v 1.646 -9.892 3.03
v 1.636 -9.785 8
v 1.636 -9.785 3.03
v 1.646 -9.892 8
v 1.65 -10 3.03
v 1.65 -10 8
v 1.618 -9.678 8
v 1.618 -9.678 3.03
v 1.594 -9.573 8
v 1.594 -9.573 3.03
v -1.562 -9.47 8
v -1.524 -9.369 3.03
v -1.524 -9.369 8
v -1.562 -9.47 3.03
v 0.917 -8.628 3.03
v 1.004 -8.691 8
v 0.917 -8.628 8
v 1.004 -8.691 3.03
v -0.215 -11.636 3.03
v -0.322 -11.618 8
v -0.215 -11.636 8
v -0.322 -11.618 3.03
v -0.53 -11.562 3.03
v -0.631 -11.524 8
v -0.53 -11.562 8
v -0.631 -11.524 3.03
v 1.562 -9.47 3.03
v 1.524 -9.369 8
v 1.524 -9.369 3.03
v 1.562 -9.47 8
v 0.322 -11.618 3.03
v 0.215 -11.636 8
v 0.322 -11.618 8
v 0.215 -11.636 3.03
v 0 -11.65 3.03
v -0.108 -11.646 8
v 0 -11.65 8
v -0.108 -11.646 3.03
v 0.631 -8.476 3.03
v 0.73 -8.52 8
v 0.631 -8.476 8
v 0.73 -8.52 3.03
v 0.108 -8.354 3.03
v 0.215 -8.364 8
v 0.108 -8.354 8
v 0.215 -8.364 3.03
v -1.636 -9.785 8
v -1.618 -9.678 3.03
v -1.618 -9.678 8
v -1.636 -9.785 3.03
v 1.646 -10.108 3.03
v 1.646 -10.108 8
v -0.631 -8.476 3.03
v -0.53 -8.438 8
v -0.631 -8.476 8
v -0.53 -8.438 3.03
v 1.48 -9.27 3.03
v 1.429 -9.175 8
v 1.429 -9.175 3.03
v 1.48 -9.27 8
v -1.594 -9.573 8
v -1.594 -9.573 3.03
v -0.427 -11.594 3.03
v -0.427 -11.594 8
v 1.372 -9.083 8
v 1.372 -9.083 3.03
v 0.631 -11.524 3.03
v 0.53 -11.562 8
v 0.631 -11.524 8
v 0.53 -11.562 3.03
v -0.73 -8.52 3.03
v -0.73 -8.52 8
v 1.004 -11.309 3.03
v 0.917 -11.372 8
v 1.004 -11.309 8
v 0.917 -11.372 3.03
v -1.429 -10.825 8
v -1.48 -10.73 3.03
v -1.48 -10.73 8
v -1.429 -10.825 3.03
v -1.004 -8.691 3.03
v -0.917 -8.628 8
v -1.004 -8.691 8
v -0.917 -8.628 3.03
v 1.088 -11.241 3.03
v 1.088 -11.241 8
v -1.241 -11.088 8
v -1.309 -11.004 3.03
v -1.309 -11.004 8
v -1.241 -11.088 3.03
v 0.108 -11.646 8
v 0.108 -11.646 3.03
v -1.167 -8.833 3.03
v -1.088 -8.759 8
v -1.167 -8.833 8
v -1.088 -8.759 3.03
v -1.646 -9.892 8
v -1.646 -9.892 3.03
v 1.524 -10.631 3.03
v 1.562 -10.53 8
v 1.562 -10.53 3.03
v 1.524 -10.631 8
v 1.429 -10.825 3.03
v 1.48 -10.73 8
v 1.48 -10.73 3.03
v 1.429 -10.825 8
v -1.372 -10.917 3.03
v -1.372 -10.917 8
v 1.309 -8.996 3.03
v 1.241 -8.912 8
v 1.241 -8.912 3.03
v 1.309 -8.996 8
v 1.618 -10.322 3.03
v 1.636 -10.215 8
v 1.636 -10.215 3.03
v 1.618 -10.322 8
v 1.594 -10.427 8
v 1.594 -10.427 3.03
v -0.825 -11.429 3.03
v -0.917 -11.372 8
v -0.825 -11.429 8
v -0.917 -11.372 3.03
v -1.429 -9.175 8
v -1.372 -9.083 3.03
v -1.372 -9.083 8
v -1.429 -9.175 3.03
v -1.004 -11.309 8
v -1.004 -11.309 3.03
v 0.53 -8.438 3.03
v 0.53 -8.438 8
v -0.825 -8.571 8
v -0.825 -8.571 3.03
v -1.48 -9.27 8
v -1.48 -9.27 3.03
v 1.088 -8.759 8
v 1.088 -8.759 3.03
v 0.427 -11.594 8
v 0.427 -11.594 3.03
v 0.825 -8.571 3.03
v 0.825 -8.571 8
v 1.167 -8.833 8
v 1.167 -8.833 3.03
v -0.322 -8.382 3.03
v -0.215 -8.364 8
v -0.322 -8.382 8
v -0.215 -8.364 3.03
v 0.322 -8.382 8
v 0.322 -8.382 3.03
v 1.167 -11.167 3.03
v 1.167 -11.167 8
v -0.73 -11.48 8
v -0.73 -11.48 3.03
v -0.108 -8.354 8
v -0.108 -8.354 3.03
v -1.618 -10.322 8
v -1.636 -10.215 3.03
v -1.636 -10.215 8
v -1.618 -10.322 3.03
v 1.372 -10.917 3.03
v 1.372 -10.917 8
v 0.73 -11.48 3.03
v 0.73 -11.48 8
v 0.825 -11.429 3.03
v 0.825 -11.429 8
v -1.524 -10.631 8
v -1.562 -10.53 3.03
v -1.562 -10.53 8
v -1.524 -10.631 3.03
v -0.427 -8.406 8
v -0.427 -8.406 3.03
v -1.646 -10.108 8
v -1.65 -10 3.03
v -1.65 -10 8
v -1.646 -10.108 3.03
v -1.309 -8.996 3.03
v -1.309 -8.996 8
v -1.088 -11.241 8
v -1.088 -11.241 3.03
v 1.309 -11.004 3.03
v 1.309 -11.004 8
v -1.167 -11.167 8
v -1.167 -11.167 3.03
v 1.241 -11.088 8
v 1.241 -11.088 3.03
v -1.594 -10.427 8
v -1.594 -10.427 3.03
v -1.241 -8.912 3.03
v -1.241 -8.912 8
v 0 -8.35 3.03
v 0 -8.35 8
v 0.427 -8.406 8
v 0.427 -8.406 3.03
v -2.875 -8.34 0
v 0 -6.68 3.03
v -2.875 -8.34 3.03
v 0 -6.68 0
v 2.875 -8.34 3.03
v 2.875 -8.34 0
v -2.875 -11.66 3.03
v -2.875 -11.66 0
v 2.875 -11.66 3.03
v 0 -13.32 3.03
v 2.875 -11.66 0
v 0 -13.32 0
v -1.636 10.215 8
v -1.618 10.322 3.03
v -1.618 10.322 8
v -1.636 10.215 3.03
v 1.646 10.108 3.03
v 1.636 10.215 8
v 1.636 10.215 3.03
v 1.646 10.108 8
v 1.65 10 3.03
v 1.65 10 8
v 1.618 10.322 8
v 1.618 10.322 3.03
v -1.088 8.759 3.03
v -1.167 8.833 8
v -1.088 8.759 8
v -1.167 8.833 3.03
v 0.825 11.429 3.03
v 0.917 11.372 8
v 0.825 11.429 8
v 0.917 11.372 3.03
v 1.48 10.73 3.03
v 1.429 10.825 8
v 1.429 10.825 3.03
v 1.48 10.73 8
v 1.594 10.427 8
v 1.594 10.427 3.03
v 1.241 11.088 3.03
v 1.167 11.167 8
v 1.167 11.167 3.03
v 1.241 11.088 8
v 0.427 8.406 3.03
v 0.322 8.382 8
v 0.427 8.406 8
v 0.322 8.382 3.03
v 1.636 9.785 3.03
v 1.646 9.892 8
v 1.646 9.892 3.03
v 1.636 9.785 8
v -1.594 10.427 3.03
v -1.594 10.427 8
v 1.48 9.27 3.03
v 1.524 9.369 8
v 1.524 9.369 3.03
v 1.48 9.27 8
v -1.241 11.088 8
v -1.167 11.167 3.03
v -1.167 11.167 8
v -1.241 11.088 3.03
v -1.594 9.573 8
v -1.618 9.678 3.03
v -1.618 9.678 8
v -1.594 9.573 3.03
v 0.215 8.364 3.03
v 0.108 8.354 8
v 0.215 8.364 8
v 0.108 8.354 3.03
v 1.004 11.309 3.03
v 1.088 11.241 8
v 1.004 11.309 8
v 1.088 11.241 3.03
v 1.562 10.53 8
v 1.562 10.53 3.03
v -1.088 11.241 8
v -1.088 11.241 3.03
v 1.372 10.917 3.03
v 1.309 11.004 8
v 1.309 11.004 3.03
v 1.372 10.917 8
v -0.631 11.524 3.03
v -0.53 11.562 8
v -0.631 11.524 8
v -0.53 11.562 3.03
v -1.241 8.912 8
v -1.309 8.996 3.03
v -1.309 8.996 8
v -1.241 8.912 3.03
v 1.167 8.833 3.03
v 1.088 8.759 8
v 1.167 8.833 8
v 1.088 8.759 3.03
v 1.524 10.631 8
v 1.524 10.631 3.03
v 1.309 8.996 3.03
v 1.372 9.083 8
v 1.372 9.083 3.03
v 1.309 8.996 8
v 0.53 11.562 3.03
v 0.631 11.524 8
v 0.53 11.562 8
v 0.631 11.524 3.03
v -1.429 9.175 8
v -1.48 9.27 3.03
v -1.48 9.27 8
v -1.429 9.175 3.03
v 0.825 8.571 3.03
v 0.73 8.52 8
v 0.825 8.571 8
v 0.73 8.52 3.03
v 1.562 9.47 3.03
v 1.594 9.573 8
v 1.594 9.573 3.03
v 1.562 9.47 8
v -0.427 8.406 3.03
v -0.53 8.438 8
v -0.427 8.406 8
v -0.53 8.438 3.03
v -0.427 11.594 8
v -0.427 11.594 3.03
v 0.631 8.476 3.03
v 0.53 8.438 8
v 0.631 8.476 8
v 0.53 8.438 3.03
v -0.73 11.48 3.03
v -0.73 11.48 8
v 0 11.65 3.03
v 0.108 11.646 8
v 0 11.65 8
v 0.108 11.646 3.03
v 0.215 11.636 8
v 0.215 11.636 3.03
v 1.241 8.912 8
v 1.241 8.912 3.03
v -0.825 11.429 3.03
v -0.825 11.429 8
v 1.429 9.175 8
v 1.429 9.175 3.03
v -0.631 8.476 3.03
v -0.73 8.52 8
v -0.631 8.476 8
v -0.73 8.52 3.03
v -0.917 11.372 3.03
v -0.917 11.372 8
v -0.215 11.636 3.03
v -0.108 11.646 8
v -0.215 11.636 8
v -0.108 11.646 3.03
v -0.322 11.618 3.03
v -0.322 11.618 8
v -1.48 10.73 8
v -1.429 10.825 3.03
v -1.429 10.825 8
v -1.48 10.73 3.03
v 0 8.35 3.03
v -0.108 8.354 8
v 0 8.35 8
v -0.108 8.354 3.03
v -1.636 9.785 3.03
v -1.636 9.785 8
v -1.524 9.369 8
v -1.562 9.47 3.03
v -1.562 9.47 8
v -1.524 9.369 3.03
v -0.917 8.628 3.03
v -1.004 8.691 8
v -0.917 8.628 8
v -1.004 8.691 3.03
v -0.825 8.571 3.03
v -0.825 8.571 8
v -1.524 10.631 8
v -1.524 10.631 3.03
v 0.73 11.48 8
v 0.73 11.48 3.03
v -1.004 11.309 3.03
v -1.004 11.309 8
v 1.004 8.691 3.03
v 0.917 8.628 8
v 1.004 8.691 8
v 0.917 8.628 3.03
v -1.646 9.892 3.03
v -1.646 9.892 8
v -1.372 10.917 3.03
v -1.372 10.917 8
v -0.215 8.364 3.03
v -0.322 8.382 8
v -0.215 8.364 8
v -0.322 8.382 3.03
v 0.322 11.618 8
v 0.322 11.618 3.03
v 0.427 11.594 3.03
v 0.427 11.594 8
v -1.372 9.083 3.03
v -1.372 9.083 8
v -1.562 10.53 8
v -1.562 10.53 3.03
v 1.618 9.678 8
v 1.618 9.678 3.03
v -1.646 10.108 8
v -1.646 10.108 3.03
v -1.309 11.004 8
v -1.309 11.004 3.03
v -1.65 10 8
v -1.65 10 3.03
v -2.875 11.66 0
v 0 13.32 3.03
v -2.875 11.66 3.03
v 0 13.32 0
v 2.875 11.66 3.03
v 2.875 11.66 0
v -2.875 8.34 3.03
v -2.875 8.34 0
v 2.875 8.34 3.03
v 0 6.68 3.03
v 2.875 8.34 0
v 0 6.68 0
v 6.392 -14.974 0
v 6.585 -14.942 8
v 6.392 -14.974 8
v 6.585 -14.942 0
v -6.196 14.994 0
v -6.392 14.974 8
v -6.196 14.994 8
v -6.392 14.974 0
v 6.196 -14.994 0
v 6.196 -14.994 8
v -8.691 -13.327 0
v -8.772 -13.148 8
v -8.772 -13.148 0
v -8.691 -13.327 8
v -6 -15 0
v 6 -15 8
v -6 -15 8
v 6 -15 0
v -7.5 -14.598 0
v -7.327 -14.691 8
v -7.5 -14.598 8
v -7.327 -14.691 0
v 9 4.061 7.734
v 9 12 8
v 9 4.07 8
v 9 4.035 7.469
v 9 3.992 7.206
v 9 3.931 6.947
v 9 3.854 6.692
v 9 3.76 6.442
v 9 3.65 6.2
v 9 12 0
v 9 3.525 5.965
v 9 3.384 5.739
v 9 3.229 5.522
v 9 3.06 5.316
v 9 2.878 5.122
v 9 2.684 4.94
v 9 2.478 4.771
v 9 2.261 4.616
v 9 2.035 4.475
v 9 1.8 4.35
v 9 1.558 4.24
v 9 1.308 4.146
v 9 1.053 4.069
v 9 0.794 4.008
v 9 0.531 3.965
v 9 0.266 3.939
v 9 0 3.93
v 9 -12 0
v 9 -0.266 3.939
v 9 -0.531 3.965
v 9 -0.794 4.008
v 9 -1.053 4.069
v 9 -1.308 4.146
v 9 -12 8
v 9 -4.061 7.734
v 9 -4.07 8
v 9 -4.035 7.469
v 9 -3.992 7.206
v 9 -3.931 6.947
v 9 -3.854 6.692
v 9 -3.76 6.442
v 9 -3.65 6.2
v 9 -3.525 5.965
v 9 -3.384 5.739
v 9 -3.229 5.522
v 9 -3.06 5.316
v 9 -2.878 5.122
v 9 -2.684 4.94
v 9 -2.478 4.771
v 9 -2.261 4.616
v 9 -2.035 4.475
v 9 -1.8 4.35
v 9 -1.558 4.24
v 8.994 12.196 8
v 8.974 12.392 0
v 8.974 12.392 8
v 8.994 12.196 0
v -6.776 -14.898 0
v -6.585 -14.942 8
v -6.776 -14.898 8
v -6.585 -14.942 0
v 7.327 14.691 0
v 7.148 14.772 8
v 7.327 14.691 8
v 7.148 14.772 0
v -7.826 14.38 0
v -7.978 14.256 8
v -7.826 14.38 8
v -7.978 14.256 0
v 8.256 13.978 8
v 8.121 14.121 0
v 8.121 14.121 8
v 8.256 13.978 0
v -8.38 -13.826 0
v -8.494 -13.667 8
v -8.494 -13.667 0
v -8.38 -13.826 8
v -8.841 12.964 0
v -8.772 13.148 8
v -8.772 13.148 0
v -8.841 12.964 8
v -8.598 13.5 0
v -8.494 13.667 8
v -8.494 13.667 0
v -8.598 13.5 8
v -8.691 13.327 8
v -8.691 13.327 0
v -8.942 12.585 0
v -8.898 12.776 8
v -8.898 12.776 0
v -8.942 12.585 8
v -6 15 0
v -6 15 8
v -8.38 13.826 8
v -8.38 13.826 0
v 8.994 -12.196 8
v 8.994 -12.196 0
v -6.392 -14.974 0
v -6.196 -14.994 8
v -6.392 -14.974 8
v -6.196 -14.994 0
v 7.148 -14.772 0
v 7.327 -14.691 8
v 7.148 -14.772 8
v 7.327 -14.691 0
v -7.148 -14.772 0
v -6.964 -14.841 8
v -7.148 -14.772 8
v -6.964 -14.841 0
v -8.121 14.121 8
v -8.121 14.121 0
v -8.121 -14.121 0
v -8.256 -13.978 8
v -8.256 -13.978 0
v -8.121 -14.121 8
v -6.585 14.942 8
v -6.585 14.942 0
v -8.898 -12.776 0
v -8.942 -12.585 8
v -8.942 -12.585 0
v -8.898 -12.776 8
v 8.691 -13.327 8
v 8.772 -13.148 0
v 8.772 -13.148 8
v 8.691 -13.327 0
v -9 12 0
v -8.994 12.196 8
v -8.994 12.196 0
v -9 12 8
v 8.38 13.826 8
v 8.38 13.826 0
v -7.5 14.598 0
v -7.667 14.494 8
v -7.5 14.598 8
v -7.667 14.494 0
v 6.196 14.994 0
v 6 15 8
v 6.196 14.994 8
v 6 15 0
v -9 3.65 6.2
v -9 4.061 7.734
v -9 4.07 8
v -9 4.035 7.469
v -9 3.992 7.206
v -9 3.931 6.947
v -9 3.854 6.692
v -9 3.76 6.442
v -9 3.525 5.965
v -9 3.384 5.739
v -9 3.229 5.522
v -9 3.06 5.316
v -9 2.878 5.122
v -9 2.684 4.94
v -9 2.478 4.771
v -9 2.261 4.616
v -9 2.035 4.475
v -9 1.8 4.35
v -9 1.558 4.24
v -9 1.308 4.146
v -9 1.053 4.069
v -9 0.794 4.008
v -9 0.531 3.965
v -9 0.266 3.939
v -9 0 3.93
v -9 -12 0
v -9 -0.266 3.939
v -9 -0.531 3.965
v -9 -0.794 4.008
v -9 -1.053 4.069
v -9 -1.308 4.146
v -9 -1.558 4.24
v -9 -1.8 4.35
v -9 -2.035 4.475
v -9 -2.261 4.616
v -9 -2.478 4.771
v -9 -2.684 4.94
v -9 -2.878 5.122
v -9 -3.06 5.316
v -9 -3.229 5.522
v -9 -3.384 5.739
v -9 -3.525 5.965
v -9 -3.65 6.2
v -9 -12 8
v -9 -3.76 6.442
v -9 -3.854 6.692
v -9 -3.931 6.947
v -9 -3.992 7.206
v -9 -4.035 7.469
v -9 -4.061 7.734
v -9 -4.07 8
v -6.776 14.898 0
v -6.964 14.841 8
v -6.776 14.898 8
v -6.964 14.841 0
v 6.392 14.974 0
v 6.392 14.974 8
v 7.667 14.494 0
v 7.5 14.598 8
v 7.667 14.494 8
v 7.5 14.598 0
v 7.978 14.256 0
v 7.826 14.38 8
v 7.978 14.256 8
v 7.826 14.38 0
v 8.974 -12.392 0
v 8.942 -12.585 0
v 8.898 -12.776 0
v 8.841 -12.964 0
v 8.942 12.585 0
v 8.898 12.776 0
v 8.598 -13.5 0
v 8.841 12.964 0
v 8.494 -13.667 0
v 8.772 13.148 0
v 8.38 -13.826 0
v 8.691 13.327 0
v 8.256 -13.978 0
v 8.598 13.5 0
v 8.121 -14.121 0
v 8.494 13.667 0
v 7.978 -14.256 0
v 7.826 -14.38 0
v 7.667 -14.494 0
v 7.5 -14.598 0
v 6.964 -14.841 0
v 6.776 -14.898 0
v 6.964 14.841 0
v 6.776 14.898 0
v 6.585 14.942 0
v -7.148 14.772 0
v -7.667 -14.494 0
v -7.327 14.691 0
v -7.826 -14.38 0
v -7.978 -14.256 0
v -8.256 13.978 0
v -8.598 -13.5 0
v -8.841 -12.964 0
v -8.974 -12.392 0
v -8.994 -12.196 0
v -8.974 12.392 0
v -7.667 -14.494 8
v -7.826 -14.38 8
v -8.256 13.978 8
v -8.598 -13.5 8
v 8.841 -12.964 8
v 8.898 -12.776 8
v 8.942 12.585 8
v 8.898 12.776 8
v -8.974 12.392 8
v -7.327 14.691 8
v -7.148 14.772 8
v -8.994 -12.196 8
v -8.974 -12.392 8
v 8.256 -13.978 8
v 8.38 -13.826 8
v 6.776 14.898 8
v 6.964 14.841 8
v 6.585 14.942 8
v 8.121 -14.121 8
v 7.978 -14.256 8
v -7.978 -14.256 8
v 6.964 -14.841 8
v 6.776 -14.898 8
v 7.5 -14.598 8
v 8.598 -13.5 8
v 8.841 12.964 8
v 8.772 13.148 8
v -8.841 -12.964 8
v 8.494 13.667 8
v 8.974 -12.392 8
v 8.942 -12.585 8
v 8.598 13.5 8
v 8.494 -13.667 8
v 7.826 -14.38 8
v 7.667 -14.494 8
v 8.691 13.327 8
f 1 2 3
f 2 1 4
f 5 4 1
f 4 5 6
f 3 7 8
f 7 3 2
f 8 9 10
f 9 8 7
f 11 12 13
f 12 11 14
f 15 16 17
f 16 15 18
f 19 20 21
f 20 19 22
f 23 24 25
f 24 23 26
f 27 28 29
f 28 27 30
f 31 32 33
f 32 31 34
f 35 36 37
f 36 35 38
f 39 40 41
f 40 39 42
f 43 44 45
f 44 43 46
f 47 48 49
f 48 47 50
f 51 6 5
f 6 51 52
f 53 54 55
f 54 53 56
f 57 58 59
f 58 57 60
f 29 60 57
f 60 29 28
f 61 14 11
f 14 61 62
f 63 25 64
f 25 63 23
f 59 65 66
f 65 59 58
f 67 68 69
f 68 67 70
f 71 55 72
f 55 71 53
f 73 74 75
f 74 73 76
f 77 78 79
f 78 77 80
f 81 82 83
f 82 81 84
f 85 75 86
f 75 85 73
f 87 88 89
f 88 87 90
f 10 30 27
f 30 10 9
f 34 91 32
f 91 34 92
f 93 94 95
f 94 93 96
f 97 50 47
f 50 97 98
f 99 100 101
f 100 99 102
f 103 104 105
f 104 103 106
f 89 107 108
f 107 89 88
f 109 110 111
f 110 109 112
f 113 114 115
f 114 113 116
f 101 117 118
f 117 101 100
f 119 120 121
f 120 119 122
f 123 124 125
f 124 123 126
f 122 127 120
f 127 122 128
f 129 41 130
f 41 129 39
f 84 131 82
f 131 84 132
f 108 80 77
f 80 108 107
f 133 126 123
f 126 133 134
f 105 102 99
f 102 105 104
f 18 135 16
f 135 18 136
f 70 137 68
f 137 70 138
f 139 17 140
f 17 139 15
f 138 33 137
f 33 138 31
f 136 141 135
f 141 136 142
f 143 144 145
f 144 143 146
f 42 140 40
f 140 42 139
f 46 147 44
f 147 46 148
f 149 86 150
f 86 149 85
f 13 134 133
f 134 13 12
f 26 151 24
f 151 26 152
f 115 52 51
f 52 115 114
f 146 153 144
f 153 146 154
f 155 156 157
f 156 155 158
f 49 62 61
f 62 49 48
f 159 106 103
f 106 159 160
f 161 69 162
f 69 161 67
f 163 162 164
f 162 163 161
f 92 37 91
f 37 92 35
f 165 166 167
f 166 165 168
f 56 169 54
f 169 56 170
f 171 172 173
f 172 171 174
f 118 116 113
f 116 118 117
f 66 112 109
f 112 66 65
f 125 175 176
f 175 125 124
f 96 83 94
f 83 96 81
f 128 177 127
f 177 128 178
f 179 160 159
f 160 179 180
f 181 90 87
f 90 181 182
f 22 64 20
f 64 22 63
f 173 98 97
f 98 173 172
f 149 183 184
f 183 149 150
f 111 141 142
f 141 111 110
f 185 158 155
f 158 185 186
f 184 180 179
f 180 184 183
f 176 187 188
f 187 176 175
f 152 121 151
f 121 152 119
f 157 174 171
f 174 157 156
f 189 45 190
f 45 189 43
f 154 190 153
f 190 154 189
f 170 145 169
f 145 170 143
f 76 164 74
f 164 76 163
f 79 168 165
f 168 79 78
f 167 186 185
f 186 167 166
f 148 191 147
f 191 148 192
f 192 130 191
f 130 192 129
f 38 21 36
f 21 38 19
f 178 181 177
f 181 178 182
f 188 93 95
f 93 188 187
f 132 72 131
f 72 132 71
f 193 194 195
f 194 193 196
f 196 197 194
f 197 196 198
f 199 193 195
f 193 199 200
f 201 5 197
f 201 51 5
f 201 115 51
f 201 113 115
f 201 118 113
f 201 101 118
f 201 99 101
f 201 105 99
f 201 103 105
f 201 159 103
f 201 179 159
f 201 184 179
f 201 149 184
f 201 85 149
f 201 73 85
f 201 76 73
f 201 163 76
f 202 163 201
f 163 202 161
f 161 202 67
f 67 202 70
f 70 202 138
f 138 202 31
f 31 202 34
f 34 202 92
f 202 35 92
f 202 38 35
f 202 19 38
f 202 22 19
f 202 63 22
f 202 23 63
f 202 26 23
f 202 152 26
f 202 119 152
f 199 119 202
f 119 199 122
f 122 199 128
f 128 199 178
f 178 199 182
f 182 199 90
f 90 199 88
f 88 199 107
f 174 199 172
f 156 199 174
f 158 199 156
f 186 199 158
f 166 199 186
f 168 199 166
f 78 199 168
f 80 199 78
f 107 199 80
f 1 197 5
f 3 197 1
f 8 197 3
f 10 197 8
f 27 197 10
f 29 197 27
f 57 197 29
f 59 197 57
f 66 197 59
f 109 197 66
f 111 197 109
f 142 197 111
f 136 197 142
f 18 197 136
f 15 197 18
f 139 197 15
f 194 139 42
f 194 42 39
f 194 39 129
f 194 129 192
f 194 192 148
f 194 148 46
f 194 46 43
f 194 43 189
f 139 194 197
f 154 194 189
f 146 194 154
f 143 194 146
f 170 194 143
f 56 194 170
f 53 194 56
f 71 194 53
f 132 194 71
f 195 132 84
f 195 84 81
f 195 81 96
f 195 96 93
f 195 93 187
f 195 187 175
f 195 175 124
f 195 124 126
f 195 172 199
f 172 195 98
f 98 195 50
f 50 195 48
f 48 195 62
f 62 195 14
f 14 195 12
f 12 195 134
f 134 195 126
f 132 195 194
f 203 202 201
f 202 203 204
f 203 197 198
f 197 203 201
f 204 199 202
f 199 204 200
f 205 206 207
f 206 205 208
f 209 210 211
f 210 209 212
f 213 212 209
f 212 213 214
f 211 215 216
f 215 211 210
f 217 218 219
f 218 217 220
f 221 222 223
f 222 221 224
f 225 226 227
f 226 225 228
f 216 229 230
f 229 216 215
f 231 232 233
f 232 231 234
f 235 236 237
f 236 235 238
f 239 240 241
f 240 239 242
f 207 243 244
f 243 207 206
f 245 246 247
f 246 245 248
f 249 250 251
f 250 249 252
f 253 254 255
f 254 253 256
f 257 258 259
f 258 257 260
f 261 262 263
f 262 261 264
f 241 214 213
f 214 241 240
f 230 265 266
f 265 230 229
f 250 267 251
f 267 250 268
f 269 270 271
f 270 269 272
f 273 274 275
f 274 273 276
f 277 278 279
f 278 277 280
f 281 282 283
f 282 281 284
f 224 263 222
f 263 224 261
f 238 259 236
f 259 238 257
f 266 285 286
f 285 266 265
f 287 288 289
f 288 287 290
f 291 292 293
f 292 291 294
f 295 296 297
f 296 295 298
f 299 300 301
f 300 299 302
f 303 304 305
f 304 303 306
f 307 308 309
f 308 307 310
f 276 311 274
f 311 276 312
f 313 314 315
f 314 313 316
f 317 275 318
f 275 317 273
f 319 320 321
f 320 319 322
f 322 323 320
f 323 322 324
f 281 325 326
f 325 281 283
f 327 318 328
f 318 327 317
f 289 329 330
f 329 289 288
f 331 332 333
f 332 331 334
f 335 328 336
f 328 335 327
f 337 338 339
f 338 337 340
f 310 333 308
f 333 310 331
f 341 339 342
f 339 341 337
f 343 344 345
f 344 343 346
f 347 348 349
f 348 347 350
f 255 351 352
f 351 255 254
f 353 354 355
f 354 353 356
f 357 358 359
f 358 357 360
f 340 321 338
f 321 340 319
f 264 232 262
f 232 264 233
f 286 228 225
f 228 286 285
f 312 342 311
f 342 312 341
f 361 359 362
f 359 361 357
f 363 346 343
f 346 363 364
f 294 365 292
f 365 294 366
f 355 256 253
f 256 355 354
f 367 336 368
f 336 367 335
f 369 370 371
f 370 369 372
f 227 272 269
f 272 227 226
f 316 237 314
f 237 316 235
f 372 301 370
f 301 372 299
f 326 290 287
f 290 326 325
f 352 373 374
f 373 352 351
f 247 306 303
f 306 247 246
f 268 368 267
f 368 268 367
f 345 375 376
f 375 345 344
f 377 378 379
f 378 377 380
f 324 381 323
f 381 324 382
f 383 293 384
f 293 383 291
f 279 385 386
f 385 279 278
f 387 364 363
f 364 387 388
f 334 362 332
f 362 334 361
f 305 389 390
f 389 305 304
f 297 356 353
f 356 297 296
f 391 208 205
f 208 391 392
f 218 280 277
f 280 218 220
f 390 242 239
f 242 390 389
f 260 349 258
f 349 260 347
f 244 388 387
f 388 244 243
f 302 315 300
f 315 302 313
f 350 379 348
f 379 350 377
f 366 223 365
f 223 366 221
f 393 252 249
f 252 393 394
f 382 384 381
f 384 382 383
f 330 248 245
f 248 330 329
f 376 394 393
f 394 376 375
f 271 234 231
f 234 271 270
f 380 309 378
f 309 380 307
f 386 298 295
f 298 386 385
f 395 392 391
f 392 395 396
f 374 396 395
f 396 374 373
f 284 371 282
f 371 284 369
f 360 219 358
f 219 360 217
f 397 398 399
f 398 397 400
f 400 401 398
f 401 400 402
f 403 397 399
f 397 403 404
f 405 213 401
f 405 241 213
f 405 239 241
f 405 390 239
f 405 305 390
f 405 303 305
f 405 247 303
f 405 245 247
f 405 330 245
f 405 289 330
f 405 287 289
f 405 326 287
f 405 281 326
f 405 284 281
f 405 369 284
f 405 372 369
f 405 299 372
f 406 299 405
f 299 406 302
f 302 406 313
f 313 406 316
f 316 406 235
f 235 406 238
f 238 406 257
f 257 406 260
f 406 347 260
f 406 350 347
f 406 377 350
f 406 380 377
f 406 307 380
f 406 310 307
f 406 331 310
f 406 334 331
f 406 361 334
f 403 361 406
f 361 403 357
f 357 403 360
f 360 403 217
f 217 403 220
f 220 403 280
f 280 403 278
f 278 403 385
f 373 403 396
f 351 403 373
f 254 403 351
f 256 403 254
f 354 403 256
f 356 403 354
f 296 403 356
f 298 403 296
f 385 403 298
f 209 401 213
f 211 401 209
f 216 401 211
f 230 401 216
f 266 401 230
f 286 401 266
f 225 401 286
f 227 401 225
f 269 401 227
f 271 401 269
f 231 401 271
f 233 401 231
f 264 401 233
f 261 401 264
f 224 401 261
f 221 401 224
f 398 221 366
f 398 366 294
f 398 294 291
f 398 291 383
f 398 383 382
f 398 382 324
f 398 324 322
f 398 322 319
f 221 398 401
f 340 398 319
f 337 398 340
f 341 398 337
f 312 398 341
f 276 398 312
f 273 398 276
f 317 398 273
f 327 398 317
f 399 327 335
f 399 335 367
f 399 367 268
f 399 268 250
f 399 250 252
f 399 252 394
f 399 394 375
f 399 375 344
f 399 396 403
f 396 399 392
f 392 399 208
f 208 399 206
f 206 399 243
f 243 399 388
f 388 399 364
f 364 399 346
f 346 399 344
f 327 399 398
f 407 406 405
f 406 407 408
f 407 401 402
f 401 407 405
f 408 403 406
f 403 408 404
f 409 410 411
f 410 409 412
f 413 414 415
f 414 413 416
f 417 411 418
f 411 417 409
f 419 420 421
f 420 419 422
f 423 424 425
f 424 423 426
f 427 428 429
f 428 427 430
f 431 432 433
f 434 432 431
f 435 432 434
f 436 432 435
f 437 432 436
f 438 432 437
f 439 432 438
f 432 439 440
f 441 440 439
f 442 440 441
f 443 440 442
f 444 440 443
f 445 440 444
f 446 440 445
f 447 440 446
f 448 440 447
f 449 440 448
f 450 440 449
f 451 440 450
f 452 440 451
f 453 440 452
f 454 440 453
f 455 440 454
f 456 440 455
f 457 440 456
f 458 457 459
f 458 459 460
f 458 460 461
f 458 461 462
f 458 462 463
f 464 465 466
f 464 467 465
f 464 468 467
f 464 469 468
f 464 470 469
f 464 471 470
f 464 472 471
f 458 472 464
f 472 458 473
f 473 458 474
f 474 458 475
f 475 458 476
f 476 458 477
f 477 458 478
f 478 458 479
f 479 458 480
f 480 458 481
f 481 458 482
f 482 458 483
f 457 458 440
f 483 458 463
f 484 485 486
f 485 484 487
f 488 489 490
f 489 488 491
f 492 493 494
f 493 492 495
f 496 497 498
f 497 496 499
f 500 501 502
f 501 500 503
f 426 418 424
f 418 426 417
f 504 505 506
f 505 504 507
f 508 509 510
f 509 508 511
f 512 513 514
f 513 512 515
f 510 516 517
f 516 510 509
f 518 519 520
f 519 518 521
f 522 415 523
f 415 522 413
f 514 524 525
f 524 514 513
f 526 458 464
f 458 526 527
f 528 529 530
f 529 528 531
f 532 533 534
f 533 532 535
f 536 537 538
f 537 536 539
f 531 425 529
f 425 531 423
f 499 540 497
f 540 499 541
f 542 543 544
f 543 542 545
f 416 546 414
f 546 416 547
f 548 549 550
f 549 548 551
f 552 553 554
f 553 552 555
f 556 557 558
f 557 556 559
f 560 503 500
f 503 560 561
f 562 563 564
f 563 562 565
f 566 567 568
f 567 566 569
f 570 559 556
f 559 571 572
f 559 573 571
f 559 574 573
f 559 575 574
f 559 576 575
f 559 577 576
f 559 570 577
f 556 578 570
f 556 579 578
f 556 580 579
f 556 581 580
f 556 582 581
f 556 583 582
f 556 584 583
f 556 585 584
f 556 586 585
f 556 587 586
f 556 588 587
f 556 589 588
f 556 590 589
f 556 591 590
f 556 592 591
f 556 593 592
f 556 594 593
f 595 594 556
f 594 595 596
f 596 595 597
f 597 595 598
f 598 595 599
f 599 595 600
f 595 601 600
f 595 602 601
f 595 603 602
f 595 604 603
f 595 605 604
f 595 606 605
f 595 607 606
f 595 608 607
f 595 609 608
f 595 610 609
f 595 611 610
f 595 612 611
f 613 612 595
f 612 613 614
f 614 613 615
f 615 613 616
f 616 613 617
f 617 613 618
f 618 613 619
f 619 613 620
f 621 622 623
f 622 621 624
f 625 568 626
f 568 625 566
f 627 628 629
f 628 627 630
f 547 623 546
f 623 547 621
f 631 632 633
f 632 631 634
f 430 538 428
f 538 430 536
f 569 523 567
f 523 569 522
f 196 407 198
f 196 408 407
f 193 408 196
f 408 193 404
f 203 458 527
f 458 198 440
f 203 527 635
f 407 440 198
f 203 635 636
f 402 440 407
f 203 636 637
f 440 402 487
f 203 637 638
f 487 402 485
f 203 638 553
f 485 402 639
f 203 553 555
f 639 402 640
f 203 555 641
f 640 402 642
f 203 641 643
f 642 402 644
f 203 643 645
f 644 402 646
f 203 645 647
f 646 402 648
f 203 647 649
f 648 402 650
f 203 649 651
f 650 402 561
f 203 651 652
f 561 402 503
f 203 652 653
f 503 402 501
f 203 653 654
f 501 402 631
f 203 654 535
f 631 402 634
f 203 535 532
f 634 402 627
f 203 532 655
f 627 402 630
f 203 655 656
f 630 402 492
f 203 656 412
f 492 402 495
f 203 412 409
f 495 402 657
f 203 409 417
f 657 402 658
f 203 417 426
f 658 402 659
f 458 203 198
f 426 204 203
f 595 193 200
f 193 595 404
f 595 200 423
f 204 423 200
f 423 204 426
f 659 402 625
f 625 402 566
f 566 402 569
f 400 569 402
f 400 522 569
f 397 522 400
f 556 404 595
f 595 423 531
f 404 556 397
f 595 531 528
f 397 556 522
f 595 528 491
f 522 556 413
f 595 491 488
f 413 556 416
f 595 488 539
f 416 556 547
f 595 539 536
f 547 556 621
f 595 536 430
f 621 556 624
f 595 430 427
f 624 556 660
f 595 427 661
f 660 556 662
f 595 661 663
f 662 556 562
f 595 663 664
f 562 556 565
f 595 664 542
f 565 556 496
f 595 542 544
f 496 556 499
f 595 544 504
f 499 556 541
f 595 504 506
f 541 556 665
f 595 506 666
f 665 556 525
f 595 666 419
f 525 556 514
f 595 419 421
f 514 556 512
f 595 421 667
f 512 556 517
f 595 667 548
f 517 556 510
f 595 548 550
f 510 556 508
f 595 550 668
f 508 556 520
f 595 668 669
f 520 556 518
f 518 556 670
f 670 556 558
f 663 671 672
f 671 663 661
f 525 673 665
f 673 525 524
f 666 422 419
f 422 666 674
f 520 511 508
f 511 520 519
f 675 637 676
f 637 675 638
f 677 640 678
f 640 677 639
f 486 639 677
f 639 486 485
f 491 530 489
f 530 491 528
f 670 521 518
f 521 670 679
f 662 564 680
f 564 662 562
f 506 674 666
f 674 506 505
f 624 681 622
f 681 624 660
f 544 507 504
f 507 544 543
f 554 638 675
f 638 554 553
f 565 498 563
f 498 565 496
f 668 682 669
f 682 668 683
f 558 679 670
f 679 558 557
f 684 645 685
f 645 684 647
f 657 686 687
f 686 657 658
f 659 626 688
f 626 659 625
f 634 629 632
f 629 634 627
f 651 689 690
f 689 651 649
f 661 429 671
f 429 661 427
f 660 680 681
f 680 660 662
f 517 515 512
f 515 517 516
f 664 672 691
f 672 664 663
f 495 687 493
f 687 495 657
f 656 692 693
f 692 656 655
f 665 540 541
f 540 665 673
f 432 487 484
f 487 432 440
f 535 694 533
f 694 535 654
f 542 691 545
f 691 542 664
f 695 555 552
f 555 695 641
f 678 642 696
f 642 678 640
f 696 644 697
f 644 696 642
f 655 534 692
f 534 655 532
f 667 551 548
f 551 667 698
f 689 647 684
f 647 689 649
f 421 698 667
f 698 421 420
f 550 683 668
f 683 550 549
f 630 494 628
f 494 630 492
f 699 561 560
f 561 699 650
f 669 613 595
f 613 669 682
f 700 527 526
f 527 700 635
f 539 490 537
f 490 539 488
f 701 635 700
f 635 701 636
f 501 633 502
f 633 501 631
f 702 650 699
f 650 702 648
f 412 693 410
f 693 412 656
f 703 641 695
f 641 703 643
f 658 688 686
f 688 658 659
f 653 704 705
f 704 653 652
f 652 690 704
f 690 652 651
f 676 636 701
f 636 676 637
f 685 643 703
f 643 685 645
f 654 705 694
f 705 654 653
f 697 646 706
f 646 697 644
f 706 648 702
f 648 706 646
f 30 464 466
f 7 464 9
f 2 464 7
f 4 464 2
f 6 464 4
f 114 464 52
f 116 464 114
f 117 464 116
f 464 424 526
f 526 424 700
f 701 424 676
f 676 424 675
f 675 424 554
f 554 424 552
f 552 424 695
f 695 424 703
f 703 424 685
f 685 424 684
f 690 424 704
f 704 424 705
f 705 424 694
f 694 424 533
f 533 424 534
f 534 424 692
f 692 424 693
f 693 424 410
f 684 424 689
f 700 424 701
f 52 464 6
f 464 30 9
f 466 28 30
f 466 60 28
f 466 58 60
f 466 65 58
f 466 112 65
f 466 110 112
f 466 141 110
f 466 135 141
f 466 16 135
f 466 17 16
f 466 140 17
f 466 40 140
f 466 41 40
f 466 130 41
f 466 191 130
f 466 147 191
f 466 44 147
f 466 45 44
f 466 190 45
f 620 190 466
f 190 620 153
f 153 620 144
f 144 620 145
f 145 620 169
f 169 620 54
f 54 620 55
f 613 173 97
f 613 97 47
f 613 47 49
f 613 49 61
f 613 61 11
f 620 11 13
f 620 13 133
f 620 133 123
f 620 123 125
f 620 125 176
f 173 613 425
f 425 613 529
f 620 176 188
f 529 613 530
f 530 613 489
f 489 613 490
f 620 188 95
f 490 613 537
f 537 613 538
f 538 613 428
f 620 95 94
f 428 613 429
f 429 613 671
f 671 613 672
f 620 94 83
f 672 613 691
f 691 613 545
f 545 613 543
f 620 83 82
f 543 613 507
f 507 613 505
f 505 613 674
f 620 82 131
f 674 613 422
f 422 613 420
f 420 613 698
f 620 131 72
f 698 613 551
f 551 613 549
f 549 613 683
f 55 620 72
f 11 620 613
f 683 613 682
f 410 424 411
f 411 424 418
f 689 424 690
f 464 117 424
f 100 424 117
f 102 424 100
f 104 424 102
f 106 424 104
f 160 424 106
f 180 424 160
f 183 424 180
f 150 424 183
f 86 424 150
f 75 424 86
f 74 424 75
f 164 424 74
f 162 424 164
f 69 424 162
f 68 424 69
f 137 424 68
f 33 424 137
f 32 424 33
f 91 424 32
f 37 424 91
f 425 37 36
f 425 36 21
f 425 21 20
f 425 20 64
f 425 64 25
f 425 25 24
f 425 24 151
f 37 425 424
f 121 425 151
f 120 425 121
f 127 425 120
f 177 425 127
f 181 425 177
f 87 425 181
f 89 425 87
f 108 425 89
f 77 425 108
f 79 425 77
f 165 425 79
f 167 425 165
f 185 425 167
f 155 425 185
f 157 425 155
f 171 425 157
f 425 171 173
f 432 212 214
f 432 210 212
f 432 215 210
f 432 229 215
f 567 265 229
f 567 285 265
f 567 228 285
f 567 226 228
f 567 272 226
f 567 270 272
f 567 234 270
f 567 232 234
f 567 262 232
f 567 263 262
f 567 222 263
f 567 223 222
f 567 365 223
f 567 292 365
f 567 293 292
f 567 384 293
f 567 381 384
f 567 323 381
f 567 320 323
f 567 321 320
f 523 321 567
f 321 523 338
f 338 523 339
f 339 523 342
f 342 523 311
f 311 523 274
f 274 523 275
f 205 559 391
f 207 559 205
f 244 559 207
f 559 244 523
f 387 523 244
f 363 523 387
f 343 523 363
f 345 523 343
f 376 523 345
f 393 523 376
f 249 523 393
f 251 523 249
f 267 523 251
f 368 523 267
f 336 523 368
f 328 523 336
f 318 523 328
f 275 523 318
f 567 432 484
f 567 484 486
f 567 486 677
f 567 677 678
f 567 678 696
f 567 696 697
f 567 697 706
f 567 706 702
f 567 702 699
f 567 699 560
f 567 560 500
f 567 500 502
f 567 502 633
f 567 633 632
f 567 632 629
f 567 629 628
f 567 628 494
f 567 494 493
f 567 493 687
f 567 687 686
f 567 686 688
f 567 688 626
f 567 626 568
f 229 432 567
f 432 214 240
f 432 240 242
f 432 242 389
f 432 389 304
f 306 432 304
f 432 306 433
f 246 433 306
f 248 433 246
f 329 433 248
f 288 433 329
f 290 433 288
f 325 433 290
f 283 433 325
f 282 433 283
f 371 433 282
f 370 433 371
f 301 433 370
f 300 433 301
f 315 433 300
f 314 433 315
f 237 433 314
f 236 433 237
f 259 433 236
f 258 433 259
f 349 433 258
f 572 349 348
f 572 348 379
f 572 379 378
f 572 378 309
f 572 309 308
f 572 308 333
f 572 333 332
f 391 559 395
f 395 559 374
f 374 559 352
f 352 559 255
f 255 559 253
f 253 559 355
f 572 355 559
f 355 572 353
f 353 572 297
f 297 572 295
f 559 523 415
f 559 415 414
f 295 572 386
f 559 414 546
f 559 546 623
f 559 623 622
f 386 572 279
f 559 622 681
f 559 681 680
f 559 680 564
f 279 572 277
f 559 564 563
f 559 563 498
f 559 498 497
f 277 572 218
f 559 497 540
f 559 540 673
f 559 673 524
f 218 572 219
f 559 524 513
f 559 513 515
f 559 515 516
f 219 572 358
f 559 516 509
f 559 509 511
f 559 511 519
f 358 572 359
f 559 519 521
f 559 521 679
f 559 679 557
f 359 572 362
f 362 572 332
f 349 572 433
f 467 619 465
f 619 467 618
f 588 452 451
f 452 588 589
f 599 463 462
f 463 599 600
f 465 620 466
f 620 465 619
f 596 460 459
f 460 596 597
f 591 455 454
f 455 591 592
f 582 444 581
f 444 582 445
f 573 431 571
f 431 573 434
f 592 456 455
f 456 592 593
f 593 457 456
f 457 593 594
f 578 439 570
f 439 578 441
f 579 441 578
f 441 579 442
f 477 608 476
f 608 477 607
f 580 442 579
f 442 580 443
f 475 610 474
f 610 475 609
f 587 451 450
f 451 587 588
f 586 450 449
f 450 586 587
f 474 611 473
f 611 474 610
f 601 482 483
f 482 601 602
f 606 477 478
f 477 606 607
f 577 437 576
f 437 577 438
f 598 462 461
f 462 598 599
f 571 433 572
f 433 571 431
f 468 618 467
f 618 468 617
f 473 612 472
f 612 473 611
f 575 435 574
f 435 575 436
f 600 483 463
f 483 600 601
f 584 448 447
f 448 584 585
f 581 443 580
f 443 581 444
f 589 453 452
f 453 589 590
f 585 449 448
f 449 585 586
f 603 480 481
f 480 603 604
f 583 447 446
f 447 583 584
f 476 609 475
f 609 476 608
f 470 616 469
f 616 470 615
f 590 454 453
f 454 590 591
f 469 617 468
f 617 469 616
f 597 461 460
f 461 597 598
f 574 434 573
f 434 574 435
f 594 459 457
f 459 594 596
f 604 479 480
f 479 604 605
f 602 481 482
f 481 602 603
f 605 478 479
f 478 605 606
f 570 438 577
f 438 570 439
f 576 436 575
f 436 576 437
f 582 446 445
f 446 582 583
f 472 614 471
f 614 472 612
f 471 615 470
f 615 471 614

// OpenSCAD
// file: ../lib/hardware.scad
include <../config.scad>
use <util.scad>

module byj_mount_holes(h = 10, rotation = 0, shaft_clearance_d = 10.2,
                       mount_hole_d = BYJ_MOUNT_HOLE_D + FIT) {
    rotate([0, 0, rotation]) {
        cylinder(d = shaft_clearance_d, h = h, center = true);
        for (x = [-BYJ_MOUNT_SPACING / 2, BYJ_MOUNT_SPACING / 2])
            translate([x, -BYJ_SHAFT_TO_HOLE_LINE, 0])
                cylinder(d = mount_hole_d, h = h, center = true);
    }
}

module bearing_608_seat(depth = BEARING_608_W, entry_chamfer = 0.6,
                        diameter = BEARING_608_OD + PRESS_FIT) {
    cylinder(d = diameter, h = depth + EPS);
    if (entry_chamfer > 0)
        translate([0, 0, depth - entry_chamfer])
            cylinder(d1 = diameter, d2 = diameter + 2 * entry_chamfer,
                     h = entry_chamfer + EPS);
}

module tripod_nut_pocket(h = TRIPOD_NUT_H + FIT, af = TRIPOD_NUT_AF + FIT) {
    hex_prism(af = af, h = h, rotation = 30);
}

module m3_nut_pocket(h = 2.6 + FIT, af = 5.5 + FIT) {
    hex_prism(af = af, h = h, rotation = 30);
}

module m4_nut_pocket(h = 3.2 + FIT, af = 7.0 + FIT) {
    hex_prism(af = af, h = h, rotation = 30);
}

module m8_nut_pocket(h = 6.8 + FIT, af = 13.0 + FIT) {
    hex_prism(af = af, h = h, rotation = 30);
}
// file: ../lib/util.scad
include <../config.scad>

function v2_add(a, b) = [a[0] + b[0], a[1] + b[1]];
function v2_sub(a, b) = [a[0] - b[0], a[1] - b[1]];
function v2_scale(a, s) = [a[0] * s, a[1] * s];
function rot2(p, a) = [p[0] * cos(a) - p[1] * sin(a), p[0] * sin(a) + p[1] * cos(a)];
function polar(r, a) = [r * cos(a), r * sin(a)];
function clamp(x, lo, hi) = min(max(x, lo), hi);

module rounded_rect_2d(size = [10, 10], r = 2, center = true) {
    sx = size[0]; sy = size[1]; rr = min(r, min(sx, sy) / 2);
    translate(center ? [0, 0] : [sx / 2, sy / 2])
        offset(r = rr) square([sx - 2 * rr, sy - 2 * rr], center = true);
}

module rounded_plate(size = [10, 10], r = 2, h = 2, center = false) {
    linear_extrude(height = h, center = center)
        rounded_rect_2d(size = size, r = r, center = true);
}

module slot_2d(length = 20, d = 4) {
    hull() {
        translate([-(length - d) / 2, 0]) circle(d = d);
        translate([(length - d) / 2, 0]) circle(d = d);
    }
}

module slot_3d(length = 20, d = 4, h = 5, center = false) {
    linear_extrude(height = h, center = center) slot_2d(length = length, d = d);
}

module hex_prism(af = 10, h = 5, center = false, rotation = 30) {
    rotate([0, 0, rotation]) cylinder(r = af / sqrt(3), h = h, center = center, $fn = 6);
}

module four_at_radius(r = 10, phase = 45) {
    for (a = [phase : 90 : phase + 270])
        rotate([0, 0, a]) translate([r, 0]) children();
}
// file: ../config.scad
// Global configuration for the printable 28BYJ-48 Alt-Az mount.
// Units: millimetres, degrees.

$fn = $preview ? 48 : 96;
EPS = 0.02;

FIT = 0.25;
PRESS_FIT = 0.10;
ELEPHANT_FOOT = 0.25;
MIN_WALL = 2.4;

// 28BYJ-48 mechanical envelope. Clone dimensions vary: verify yours.
BYJ_BODY_D = 28.0;
BYJ_BODY_H = 19.0;
BYJ_FLANGE_T = 1.5;
BYJ_BOSS_D = 9.0;
BYJ_BOSS_H = 2.5;
BYJ_SHAFT_D = 5.0;
BYJ_SHAFT_FLAT = 3.0;
BYJ_SHAFT_L = 10.0;
BYJ_MOUNT_SPACING = 35.0;
BYJ_MOUNT_HOLE_D = 4.0;
BYJ_SHAFT_TO_HOLE_LINE = 8.0;
BYJ_BODY_CENTER_FROM_SHAFT = [0, -11.0];
BYJ_CABLE_BOX = [14.6, 8.0, 11.0];

// Additional reducer: 12 -> 48 and 12 -> 60 = 20:1.
GEAR_MODULE = 1.0;
GEAR_PRESSURE_ANGLE = 20;
GEAR_BACKLASH = 0.12;
GEAR_CLEARANCE = 0.25;
GEAR_Z1 = 12;
GEAR_Z2 = 48;
GEAR_Z3 = 12;
GEAR_Z4 = 60;
GEAR_FACE = 5.0;
GEAR_GAP = 1.0;
GEAR_STACK_H = GEAR_FACE * 2 + GEAR_GAP;
GEAR_RATIO = (GEAR_Z2 / GEAR_Z1) * (GEAR_Z4 / GEAR_Z3);
CD_STAGE1 = GEAR_MODULE * (GEAR_Z1 + GEAR_Z2) / 2;
CD_STAGE2 = GEAR_MODULE * (GEAR_Z3 + GEAR_Z4) / 2;

REDUCER_OUTPUT = [0, 0];
REDUCER_INTERMEDIATE = [CD_STAGE2, 0];
REDUCER_MOTOR = [CD_STAGE2, CD_STAGE1];
REDUCER_MOTOR_ROT = 130;
INTERMEDIATE_AXLE_D = 3.2;

BEARING_608_ID = 8.0;
BEARING_608_OD = 22.0;
BEARING_608_W = 7.0;
AXIS_SHAFT_D = 8.0;
AXIS_CLEARANCE_D = 8.3;
M3_CLEARANCE_D = 3.3;
M4_CLEARANCE_D = 4.4;
M5_CLEARANCE_D = 5.5;
M8_CLEARANCE_D = 8.6;

TRIPOD_THREAD_D = 6.35;
TRIPOD_CLEARANCE_D = 6.8;
TRIPOD_NUT_AF = 11.2;
TRIPOD_NUT_H = 5.8;

// Azimuth base, gearbox cover and turntable.
AZ_BASE_D = 132.0;
AZ_COVER_BOLT_R = 59.0;
AZ_BASE_PLATE_H = 3.0;
AZ_PEDESTAL_H = 24.0;
AZ_PEDESTAL_D = 48.0;
AZ_COVER_H = 16.0;
AZ_COVER_WALL = 3.0;
AZ_COVER_TOP_T = 3.0;
AZ_TURNTABLE_D = 120.0;
AZ_TURNTABLE_H = 9.0;
AZ_GLIDE_RADIUS = 43.0;
AZ_GLIDE_D = 8.0;
AZ_GLIDE_GAP = 1.0;
AZ_COVER_CLEARANCE = 0.8;
AZ_OUTPUT_SPACER_H = 5.0;
AZ_OUTPUT_PASSAGE_D = 32.0;
AZ_OUTPUT_LOCATOR_D = 30.0;
AZ_OUTPUT_LOCATOR_DEPTH = 2.0;
AZ_OUTPUT_BOLT_R = 11.5;
AZ_AXIS_NUT_RECESS_D = 17.0;
AZ_AXIS_NUT_RECESS_H = 4.0;
AZ_YOKE_MOUNT_X = 36.0;
AZ_YOKE_MOUNT_Y = 10.0;
AZ_YOKE_NUT_DEPTH = 3.5;

// Azimuth 20:1 printed reducer axial stack and interfaces.
AZ_GEAR_Z0 = 1.0;
AZ_UPPER_GEAR_Z = AZ_GEAR_Z0 + GEAR_FACE + GEAR_GAP;
AZ_GEAR_TOP_CLEARANCE = AZ_COVER_H - AZ_COVER_TOP_T - (AZ_UPPER_GEAR_Z + GEAR_FACE);
AZ_MOTOR_PINION_HUB_D = 10.8;
AZ_MOTOR_PINION_HUB_H = 7.0;
AZ_COMPOUND_HUB_D = 10.0;
AZ_INTERMEDIATE_BORE_D = 3.35;
AZ_OUTPUT_HUB_D = 29.6;
AZ_OUTPUT_HUB_H = AZ_COVER_H + AZ_GLIDE_GAP + AZ_OUTPUT_LOCATOR_DEPTH - AZ_UPPER_GEAR_Z;
AZ_OUTPUT_NUT_DEPTH = 2.8;

YOKE_AXIS_Z = 96.0;
YOKE_INNER_W = 92.0;
YOKE_ARM_T = 8.0;
YOKE_ARM_W = 34.0;
YOKE_OUTER_W = YOKE_INNER_W + 2 * YOKE_ARM_T;
YOKE_FOOT_LEN = 42.0;
YOKE_FOOT_W = 30.0;
YOKE_ARM_CENTER_X = YOKE_INNER_W / 2 + YOKE_ARM_T / 2;
YOKE_TENON_LEN = 28.0;
YOKE_BRIDGE_X = 112.0;
YOKE_BRIDGE_Y = 36.0;
YOKE_BRIDGE_H = 12.0;
YOKE_SLOT_DEPTH = 9.0;
YOKE_SLOT_CLEARANCE = 0.35;
YOKE_LOCK_LOCAL_Y = 3.0;
YOKE_BEARING_POCKET_DEPTH = 7.2;
YOKE_DRIVE_BOSS_D = 54.0;
YOKE_IDLER_BOSS_D = 44.0;
YOKE_GEARBOX_BOLT_R = 18.0;
ALT_GEARBOX_GAP = 14.0;
ALT_BACKPLATE_H = 3.2;
ALT_SHAFT_L = 165.0;

PAYLOAD_PLATE = [80.0, 112.0, 6.0];
PAYLOAD_SLOT_L = 48.0;
PAYLOAD_SLOT_D = TRIPOD_CLEARANCE_D;
SHAFT_CLAMP_W = 18.0;
SHAFT_CLAMP_L = 30.0;
SHAFT_CLAMP_H = 10.0;
PAYLOAD_CLAMP_HALF_H = 8.0;
PAYLOAD_CLAMP_X = 27.0;
PAYLOAD_CLAMP_BOLT_Y = 10.0;
PAYLOAD_PLATE_OFFSET_Z = 8.0;

// Altitude 20:1 drive, mounted outside yoke_arm_drive.
// Local gearbox coordinates are centered on the ALT shaft; +Z points outboard.
ALT_PLATE_T = 3.2;
ALT_OUTPUT_CENTER = [0, 0];
ALT_INTERMEDIATE = [CD_STAGE2, 0];
ALT_MOTOR = [CD_STAGE2, -CD_STAGE1];
ALT_MOTOR_ROT = 0;
ALT_GEAR_Z0 = ALT_PLATE_T + 1.0;
ALT_UPPER_GEAR_Z = ALT_GEAR_Z0 + GEAR_FACE + GEAR_GAP;
ALT_GUARD_H = 17.0;
ALT_GUARD_WALL = 2.4;
ALT_GUARD_TOP_T = 2.4;
ALT_GUARD_TOP_Z = ALT_PLATE_T + ALT_GUARD_H;
ALT_GEAR_TOP_CLEARANCE = ALT_GUARD_TOP_Z - ALT_GUARD_TOP_T - (ALT_UPPER_GEAR_Z + GEAR_FACE);
ALT_OUTLINE_R_OUTPUT = 36.0;
ALT_OUTLINE_R_INTERMEDIATE = 30.0;
ALT_OUTLINE_R_MOTOR = 25.0;
ALT_PLATE_OUTPUT_CLEAR_D = 24.0;
ALT_INTERMEDIATE_BORE_D = 3.35;
ALT_COMPOUND_HUB_D = 10.0;
ALT_MOTOR_PINION_HUB_D = 10.8;
ALT_OUTPUT_BORE_D = 8.20;
ALT_OUTPUT_HUB_D = 24.0;
ALT_OUTPUT_HUB_H = 15.0;
ALT_OUTPUT_SET_PILOT_D = 2.7;
ALT_OUTPUT_SET_Z = 11.2;
ALT_OUTPUT_SPACER_D = 12.0;
ALT_OUTPUT_SPACER_H = ALT_UPPER_GEAR_Z - 0.15;
ALT_GUARD_CENTER_CLEAR_D = 26.0;
ALT_GUARD_BOSS_H = 4.0;
ALT_GUARD_SCREW_POS = [[-30,-24],[-30,24],[62,22],[58,-44]];
ALT_GUARD_SCREW_BOSS_D = 10.0;
ALT_GUARD_NUT_DEPTH = 2.8;
ALT_YOKE_HEAD_RECESS_D = 6.4;
ALT_YOKE_HEAD_RECESS_H = 1.7;

// Removable tabletop adapter for flat-surface operation.
TABLETOP_BASE_D = 190.0;
TABLETOP_BASE_T = 8.0;
TABLETOP_LOCATOR_D = AZ_PEDESTAL_D + 1.0;
TABLETOP_LOCATOR_DEPTH = 1.5;
TABLETOP_CENTER_CLEAR_D = TRIPOD_CLEARANCE_D;
TABLETOP_BOLT_HEAD_D = 16.0;
TABLETOP_BOLT_HEAD_RECESS_H = 5.0;
TABLETOP_FOOT_R = 82.0;
TABLETOP_FOOT_D = 18.0;
TABLETOP_FOOT_RECESS_H = 1.2;

BYJ_NOMINAL_HALFSTEPS_PER_OUTPUT_REV = 4096;
AXIS_NOMINAL_STEPS_PER_REV = BYJ_NOMINAL_HALFSTEPS_PER_OUTPUT_REV * GEAR_RATIO;
// main file
include <../config.scad>
use <../lib/util.scad>
use <../lib/hardware.scad>

module payload_clamp_lower() {
    difference() {
        rounded_plate(size = [SHAFT_CLAMP_W, SHAFT_CLAMP_L],
                      r = 3, h = PAYLOAD_CLAMP_HALF_H);

        // Upper semicircle of the 8 mm shaft bore; split face is the top face.
        translate([0, 0, PAYLOAD_CLAMP_HALF_H])
            rotate([0, 90, 0])
                cylinder(d = AXIS_SHAFT_D + 0.14,
                         h = SHAFT_CLAMP_W + 2 * EPS, center = true);

        for (y = [-PAYLOAD_CLAMP_BOLT_Y, PAYLOAD_CLAMP_BOLT_Y]) {
            translate([0, y, -EPS])
                cylinder(d = M3_CLEARANCE_D,
                         h = PAYLOAD_CLAMP_HALF_H + 2 * EPS);
            translate([0, y, -EPS])
                m3_nut_pocket(h = 2.8 + FIT);
        }
    }
}

payload_clamp_lower();
